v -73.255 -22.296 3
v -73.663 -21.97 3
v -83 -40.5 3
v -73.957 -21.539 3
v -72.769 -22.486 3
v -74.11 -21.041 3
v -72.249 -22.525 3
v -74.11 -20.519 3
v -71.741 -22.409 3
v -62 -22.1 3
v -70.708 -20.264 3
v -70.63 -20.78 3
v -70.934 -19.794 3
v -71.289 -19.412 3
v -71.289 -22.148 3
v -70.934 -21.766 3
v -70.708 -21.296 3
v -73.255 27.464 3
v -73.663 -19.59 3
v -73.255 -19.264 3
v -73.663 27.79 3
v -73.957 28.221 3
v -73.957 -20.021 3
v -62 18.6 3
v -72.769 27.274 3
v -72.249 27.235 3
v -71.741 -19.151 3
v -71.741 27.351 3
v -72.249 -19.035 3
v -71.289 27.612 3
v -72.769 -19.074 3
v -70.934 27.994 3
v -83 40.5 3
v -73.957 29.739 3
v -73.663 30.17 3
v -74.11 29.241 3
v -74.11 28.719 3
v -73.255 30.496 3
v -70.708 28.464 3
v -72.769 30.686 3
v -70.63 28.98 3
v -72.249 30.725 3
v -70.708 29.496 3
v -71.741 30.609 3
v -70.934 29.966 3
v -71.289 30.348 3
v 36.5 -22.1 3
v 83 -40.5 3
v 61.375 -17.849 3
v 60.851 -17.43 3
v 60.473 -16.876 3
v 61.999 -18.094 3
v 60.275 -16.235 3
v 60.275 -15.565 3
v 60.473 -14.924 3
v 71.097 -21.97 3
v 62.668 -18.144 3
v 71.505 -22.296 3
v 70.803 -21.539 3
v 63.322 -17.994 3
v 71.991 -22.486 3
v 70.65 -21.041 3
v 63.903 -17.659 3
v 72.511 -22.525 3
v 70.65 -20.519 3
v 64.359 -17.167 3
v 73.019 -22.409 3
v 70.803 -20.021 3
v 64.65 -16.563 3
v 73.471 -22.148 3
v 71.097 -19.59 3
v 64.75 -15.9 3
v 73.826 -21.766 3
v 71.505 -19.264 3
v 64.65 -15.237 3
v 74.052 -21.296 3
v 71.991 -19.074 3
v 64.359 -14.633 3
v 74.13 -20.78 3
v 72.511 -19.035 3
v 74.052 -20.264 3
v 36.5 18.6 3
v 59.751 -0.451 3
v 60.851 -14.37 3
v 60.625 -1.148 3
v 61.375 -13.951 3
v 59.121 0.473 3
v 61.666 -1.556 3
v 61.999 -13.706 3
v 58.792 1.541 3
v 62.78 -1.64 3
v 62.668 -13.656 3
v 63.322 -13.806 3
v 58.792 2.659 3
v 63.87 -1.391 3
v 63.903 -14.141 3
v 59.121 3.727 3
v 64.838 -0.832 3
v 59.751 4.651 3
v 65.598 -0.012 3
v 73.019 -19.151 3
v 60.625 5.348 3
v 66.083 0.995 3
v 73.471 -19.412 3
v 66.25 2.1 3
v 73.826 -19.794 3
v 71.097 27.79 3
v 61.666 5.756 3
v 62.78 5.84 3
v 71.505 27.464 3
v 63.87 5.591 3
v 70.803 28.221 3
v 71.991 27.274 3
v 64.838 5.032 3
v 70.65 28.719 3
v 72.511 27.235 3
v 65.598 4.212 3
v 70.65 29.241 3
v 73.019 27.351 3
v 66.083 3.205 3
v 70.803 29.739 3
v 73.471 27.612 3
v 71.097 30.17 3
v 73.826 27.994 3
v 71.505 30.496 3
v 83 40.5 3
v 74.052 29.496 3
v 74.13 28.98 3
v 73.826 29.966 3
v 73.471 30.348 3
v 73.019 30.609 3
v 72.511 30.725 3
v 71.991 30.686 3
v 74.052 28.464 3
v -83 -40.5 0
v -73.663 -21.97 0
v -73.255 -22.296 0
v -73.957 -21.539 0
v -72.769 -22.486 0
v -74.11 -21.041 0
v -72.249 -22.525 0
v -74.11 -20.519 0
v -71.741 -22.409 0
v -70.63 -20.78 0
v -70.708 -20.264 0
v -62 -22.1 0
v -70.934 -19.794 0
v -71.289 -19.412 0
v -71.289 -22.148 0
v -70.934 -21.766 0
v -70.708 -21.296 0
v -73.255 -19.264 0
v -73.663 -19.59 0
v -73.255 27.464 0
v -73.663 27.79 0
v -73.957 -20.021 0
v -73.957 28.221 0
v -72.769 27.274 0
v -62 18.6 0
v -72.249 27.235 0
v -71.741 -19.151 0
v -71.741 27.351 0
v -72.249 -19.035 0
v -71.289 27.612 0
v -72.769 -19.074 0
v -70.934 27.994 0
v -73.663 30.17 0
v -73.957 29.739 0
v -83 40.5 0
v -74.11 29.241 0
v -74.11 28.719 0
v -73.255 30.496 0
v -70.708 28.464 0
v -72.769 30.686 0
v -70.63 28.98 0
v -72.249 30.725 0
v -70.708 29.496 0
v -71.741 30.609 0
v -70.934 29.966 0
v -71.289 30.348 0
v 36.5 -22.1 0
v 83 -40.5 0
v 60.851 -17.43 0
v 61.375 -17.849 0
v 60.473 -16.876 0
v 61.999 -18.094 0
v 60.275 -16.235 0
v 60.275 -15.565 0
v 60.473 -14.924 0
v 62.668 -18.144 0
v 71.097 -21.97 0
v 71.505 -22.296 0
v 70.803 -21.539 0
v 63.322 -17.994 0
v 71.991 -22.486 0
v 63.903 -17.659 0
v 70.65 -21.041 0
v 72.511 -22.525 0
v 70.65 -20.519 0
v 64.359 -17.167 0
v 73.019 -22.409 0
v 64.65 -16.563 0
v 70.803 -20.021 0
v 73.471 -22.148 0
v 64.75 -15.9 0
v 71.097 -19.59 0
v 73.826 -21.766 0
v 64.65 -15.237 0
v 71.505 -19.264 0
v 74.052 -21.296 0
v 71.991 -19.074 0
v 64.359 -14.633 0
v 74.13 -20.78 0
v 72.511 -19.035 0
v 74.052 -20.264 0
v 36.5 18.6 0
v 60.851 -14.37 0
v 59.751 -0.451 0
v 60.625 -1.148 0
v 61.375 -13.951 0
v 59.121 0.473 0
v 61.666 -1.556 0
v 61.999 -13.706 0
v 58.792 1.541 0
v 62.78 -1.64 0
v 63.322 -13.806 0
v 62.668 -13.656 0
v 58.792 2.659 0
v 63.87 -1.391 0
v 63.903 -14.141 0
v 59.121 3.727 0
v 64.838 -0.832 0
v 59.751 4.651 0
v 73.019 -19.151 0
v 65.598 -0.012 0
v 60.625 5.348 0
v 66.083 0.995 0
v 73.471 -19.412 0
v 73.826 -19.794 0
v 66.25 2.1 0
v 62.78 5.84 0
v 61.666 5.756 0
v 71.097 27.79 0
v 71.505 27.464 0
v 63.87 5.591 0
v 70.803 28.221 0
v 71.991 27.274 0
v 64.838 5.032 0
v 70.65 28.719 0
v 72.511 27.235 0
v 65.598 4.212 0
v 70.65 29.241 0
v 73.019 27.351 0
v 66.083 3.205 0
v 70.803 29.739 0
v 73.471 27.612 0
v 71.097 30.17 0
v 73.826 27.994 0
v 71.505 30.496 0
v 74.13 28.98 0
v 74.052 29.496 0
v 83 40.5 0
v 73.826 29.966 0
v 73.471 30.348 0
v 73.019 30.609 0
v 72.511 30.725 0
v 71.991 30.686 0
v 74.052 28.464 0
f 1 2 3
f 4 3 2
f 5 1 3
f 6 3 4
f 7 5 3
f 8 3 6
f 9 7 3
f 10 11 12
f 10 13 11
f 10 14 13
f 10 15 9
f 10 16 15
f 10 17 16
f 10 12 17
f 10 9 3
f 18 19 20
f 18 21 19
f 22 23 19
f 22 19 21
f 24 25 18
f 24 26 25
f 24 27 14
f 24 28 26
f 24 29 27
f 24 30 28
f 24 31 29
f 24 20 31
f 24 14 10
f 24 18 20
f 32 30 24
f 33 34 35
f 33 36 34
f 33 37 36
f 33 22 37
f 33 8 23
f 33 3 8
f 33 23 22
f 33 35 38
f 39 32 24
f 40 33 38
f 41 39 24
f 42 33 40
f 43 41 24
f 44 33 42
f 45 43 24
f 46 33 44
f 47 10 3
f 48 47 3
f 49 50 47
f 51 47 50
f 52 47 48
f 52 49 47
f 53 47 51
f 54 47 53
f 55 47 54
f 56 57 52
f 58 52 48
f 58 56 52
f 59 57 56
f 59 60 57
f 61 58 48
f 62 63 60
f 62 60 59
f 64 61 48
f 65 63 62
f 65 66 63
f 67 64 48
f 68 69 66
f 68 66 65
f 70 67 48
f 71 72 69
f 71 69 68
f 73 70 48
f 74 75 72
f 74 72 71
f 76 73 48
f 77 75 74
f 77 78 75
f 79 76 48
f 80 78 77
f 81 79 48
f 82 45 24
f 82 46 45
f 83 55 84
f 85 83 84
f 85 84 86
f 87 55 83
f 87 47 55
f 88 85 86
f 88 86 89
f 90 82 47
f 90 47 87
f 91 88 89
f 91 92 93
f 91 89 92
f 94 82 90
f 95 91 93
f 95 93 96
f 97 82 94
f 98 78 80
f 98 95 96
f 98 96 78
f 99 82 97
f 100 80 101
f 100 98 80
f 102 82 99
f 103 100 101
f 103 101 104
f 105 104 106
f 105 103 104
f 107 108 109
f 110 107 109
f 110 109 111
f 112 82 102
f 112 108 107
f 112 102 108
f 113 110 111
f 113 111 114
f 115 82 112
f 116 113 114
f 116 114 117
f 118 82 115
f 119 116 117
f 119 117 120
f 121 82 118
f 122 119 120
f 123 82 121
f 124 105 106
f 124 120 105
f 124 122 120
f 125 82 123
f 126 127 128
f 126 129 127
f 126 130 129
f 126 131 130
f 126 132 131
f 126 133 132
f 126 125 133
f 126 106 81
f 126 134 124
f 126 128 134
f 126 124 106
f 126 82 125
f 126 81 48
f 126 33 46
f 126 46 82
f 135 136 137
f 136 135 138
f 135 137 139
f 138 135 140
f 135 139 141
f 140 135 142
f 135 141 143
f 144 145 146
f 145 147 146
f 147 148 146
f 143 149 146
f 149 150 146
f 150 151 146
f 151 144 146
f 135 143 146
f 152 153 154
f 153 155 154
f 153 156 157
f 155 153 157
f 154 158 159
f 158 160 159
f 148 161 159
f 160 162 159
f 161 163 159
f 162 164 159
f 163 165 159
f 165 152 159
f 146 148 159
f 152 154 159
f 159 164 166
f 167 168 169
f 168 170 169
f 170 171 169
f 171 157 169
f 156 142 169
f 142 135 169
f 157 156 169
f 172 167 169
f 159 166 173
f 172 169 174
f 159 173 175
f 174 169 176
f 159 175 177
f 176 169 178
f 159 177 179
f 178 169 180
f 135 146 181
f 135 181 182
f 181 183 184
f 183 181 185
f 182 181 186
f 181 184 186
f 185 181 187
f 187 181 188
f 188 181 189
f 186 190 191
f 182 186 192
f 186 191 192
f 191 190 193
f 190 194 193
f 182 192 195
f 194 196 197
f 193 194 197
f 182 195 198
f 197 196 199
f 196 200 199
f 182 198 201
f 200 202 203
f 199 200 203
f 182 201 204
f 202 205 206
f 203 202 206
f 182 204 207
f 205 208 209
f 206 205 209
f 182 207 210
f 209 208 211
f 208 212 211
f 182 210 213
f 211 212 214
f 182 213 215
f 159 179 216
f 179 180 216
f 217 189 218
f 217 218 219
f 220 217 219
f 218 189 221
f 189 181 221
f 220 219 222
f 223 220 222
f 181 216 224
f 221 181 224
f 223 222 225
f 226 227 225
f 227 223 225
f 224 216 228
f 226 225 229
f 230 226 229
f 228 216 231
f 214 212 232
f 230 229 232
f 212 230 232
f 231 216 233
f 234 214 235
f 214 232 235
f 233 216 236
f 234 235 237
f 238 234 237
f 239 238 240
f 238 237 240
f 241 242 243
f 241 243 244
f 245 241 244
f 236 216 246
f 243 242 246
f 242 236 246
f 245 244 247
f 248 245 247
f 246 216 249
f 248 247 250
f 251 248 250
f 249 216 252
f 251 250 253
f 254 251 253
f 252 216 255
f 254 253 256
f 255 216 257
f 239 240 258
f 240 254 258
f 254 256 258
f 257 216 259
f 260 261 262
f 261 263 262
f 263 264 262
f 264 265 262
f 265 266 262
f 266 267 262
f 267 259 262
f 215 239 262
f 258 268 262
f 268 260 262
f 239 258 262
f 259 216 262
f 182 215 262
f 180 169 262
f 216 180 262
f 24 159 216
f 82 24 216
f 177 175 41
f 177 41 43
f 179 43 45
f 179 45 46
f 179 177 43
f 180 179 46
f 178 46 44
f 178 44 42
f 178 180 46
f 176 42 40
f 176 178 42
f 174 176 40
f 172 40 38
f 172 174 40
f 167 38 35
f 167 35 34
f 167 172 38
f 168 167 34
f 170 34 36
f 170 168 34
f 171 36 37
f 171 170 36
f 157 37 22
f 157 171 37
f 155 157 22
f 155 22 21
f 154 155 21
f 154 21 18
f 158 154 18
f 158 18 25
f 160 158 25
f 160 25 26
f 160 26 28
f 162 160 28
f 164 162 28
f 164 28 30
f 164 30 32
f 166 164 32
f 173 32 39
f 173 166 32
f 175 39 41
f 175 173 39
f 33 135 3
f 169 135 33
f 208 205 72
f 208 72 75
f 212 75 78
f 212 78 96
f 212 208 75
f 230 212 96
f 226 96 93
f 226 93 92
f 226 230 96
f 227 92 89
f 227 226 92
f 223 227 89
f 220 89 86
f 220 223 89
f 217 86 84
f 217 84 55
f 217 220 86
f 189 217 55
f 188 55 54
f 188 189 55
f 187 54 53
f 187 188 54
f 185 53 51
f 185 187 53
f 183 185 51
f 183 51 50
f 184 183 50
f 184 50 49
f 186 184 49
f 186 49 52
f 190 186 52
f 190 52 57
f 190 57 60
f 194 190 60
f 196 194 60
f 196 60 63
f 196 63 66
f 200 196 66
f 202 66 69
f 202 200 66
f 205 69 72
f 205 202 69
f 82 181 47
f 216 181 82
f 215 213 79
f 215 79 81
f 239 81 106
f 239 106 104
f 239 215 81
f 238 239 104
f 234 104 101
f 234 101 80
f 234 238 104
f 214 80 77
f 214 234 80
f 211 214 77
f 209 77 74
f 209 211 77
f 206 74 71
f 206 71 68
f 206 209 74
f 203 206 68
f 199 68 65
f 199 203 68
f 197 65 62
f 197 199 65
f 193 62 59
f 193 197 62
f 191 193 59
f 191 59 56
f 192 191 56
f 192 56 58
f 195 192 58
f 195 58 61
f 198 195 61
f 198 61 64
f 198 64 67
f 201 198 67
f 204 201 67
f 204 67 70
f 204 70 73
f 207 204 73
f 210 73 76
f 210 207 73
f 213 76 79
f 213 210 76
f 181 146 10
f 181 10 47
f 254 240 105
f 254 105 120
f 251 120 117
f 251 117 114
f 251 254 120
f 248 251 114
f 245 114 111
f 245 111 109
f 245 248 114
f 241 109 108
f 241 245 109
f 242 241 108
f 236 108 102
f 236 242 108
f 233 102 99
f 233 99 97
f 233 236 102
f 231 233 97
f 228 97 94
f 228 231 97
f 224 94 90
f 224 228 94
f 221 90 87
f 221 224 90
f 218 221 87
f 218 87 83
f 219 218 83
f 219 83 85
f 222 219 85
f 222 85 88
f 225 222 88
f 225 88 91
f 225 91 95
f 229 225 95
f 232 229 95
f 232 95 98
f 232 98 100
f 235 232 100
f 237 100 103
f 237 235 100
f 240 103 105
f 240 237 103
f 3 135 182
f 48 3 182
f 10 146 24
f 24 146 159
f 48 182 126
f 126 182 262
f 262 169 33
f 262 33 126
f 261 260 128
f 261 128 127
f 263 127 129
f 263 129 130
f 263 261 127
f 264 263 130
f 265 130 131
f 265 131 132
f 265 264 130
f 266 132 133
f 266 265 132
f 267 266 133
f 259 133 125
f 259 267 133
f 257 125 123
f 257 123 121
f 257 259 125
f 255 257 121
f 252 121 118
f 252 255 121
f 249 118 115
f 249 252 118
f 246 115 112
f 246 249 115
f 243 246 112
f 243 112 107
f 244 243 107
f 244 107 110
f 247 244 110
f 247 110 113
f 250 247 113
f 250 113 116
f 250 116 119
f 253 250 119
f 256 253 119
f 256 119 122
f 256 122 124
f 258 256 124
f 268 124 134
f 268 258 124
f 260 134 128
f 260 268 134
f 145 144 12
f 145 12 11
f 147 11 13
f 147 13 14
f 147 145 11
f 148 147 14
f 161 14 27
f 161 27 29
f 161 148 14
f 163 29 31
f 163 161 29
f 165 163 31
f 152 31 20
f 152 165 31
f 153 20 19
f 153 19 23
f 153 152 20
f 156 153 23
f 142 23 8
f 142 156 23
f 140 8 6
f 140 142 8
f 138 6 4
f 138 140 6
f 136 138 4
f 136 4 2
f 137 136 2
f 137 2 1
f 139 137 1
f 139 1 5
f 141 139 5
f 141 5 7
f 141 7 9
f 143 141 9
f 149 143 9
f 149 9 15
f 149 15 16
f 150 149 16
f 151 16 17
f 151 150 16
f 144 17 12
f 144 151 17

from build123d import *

# Parameters (mm, degrees)
F0_W     = 166
F0_H     = 81
F0_W_2   = 150
F0_H_2   = 63.2
F0_R     = 1.75
F0_W_3   = 98.5
F0_H_3   = 40.7
F0_W_4   = 6
F0_H_4   = 6
F0_W_5   = 13
F0_H_5   = 12
F0_R_2   = 3.75
F0_R_3   = 2.25
F1_DEPTH = 3


with BuildPart() as f1:
    # F0 (on Top) → F1 (new body)
    with BuildSketch(Plane.XY):
        Rectangle(F0_W, F0_H)
        Rectangle(F0_W_2, F0_H_2, mode=Mode.SUBTRACT)
        Rectangle(F0_W_2, F0_H_2)
        with Locations((-72.38, -20.78)):
            Circle(F0_R, mode=Mode.SUBTRACT)
        with Locations((-12.75, -1.75)):
            Rectangle(F0_W_3, F0_H_3, mode=Mode.SUBTRACT)
        with Locations((72.38, -20.78)):
            Circle(F0_R, mode=Mode.SUBTRACT)
        with Locations((62.5, -15.9)):
            Rectangle(F0_W_4, F0_H_4, mode=Mode.SUBTRACT)
        with Locations((-72.38, 28.98)):
            Circle(F0_R, mode=Mode.SUBTRACT)
        with Locations((62.5, 2.1)):
            Rectangle(F0_W_5, F0_H_5, mode=Mode.SUBTRACT)
        with Locations((72.38, 28.98)):
            Circle(F0_R, mode=Mode.SUBTRACT)
        with Locations((62.5, 2.1)):
            Rectangle(F0_W_5, F0_H_5)
        with Locations((62.5, 2.1)):
            Circle(F0_R_2, mode=Mode.SUBTRACT)
        with Locations((62.5, -15.9)):
            Rectangle(F0_W_4, F0_H_4)
        with Locations((62.5, -15.9)):
            Circle(F0_R_3, mode=Mode.SUBTRACT)
    extrude(amount=F1_DEPTH)


solid = f1.part
